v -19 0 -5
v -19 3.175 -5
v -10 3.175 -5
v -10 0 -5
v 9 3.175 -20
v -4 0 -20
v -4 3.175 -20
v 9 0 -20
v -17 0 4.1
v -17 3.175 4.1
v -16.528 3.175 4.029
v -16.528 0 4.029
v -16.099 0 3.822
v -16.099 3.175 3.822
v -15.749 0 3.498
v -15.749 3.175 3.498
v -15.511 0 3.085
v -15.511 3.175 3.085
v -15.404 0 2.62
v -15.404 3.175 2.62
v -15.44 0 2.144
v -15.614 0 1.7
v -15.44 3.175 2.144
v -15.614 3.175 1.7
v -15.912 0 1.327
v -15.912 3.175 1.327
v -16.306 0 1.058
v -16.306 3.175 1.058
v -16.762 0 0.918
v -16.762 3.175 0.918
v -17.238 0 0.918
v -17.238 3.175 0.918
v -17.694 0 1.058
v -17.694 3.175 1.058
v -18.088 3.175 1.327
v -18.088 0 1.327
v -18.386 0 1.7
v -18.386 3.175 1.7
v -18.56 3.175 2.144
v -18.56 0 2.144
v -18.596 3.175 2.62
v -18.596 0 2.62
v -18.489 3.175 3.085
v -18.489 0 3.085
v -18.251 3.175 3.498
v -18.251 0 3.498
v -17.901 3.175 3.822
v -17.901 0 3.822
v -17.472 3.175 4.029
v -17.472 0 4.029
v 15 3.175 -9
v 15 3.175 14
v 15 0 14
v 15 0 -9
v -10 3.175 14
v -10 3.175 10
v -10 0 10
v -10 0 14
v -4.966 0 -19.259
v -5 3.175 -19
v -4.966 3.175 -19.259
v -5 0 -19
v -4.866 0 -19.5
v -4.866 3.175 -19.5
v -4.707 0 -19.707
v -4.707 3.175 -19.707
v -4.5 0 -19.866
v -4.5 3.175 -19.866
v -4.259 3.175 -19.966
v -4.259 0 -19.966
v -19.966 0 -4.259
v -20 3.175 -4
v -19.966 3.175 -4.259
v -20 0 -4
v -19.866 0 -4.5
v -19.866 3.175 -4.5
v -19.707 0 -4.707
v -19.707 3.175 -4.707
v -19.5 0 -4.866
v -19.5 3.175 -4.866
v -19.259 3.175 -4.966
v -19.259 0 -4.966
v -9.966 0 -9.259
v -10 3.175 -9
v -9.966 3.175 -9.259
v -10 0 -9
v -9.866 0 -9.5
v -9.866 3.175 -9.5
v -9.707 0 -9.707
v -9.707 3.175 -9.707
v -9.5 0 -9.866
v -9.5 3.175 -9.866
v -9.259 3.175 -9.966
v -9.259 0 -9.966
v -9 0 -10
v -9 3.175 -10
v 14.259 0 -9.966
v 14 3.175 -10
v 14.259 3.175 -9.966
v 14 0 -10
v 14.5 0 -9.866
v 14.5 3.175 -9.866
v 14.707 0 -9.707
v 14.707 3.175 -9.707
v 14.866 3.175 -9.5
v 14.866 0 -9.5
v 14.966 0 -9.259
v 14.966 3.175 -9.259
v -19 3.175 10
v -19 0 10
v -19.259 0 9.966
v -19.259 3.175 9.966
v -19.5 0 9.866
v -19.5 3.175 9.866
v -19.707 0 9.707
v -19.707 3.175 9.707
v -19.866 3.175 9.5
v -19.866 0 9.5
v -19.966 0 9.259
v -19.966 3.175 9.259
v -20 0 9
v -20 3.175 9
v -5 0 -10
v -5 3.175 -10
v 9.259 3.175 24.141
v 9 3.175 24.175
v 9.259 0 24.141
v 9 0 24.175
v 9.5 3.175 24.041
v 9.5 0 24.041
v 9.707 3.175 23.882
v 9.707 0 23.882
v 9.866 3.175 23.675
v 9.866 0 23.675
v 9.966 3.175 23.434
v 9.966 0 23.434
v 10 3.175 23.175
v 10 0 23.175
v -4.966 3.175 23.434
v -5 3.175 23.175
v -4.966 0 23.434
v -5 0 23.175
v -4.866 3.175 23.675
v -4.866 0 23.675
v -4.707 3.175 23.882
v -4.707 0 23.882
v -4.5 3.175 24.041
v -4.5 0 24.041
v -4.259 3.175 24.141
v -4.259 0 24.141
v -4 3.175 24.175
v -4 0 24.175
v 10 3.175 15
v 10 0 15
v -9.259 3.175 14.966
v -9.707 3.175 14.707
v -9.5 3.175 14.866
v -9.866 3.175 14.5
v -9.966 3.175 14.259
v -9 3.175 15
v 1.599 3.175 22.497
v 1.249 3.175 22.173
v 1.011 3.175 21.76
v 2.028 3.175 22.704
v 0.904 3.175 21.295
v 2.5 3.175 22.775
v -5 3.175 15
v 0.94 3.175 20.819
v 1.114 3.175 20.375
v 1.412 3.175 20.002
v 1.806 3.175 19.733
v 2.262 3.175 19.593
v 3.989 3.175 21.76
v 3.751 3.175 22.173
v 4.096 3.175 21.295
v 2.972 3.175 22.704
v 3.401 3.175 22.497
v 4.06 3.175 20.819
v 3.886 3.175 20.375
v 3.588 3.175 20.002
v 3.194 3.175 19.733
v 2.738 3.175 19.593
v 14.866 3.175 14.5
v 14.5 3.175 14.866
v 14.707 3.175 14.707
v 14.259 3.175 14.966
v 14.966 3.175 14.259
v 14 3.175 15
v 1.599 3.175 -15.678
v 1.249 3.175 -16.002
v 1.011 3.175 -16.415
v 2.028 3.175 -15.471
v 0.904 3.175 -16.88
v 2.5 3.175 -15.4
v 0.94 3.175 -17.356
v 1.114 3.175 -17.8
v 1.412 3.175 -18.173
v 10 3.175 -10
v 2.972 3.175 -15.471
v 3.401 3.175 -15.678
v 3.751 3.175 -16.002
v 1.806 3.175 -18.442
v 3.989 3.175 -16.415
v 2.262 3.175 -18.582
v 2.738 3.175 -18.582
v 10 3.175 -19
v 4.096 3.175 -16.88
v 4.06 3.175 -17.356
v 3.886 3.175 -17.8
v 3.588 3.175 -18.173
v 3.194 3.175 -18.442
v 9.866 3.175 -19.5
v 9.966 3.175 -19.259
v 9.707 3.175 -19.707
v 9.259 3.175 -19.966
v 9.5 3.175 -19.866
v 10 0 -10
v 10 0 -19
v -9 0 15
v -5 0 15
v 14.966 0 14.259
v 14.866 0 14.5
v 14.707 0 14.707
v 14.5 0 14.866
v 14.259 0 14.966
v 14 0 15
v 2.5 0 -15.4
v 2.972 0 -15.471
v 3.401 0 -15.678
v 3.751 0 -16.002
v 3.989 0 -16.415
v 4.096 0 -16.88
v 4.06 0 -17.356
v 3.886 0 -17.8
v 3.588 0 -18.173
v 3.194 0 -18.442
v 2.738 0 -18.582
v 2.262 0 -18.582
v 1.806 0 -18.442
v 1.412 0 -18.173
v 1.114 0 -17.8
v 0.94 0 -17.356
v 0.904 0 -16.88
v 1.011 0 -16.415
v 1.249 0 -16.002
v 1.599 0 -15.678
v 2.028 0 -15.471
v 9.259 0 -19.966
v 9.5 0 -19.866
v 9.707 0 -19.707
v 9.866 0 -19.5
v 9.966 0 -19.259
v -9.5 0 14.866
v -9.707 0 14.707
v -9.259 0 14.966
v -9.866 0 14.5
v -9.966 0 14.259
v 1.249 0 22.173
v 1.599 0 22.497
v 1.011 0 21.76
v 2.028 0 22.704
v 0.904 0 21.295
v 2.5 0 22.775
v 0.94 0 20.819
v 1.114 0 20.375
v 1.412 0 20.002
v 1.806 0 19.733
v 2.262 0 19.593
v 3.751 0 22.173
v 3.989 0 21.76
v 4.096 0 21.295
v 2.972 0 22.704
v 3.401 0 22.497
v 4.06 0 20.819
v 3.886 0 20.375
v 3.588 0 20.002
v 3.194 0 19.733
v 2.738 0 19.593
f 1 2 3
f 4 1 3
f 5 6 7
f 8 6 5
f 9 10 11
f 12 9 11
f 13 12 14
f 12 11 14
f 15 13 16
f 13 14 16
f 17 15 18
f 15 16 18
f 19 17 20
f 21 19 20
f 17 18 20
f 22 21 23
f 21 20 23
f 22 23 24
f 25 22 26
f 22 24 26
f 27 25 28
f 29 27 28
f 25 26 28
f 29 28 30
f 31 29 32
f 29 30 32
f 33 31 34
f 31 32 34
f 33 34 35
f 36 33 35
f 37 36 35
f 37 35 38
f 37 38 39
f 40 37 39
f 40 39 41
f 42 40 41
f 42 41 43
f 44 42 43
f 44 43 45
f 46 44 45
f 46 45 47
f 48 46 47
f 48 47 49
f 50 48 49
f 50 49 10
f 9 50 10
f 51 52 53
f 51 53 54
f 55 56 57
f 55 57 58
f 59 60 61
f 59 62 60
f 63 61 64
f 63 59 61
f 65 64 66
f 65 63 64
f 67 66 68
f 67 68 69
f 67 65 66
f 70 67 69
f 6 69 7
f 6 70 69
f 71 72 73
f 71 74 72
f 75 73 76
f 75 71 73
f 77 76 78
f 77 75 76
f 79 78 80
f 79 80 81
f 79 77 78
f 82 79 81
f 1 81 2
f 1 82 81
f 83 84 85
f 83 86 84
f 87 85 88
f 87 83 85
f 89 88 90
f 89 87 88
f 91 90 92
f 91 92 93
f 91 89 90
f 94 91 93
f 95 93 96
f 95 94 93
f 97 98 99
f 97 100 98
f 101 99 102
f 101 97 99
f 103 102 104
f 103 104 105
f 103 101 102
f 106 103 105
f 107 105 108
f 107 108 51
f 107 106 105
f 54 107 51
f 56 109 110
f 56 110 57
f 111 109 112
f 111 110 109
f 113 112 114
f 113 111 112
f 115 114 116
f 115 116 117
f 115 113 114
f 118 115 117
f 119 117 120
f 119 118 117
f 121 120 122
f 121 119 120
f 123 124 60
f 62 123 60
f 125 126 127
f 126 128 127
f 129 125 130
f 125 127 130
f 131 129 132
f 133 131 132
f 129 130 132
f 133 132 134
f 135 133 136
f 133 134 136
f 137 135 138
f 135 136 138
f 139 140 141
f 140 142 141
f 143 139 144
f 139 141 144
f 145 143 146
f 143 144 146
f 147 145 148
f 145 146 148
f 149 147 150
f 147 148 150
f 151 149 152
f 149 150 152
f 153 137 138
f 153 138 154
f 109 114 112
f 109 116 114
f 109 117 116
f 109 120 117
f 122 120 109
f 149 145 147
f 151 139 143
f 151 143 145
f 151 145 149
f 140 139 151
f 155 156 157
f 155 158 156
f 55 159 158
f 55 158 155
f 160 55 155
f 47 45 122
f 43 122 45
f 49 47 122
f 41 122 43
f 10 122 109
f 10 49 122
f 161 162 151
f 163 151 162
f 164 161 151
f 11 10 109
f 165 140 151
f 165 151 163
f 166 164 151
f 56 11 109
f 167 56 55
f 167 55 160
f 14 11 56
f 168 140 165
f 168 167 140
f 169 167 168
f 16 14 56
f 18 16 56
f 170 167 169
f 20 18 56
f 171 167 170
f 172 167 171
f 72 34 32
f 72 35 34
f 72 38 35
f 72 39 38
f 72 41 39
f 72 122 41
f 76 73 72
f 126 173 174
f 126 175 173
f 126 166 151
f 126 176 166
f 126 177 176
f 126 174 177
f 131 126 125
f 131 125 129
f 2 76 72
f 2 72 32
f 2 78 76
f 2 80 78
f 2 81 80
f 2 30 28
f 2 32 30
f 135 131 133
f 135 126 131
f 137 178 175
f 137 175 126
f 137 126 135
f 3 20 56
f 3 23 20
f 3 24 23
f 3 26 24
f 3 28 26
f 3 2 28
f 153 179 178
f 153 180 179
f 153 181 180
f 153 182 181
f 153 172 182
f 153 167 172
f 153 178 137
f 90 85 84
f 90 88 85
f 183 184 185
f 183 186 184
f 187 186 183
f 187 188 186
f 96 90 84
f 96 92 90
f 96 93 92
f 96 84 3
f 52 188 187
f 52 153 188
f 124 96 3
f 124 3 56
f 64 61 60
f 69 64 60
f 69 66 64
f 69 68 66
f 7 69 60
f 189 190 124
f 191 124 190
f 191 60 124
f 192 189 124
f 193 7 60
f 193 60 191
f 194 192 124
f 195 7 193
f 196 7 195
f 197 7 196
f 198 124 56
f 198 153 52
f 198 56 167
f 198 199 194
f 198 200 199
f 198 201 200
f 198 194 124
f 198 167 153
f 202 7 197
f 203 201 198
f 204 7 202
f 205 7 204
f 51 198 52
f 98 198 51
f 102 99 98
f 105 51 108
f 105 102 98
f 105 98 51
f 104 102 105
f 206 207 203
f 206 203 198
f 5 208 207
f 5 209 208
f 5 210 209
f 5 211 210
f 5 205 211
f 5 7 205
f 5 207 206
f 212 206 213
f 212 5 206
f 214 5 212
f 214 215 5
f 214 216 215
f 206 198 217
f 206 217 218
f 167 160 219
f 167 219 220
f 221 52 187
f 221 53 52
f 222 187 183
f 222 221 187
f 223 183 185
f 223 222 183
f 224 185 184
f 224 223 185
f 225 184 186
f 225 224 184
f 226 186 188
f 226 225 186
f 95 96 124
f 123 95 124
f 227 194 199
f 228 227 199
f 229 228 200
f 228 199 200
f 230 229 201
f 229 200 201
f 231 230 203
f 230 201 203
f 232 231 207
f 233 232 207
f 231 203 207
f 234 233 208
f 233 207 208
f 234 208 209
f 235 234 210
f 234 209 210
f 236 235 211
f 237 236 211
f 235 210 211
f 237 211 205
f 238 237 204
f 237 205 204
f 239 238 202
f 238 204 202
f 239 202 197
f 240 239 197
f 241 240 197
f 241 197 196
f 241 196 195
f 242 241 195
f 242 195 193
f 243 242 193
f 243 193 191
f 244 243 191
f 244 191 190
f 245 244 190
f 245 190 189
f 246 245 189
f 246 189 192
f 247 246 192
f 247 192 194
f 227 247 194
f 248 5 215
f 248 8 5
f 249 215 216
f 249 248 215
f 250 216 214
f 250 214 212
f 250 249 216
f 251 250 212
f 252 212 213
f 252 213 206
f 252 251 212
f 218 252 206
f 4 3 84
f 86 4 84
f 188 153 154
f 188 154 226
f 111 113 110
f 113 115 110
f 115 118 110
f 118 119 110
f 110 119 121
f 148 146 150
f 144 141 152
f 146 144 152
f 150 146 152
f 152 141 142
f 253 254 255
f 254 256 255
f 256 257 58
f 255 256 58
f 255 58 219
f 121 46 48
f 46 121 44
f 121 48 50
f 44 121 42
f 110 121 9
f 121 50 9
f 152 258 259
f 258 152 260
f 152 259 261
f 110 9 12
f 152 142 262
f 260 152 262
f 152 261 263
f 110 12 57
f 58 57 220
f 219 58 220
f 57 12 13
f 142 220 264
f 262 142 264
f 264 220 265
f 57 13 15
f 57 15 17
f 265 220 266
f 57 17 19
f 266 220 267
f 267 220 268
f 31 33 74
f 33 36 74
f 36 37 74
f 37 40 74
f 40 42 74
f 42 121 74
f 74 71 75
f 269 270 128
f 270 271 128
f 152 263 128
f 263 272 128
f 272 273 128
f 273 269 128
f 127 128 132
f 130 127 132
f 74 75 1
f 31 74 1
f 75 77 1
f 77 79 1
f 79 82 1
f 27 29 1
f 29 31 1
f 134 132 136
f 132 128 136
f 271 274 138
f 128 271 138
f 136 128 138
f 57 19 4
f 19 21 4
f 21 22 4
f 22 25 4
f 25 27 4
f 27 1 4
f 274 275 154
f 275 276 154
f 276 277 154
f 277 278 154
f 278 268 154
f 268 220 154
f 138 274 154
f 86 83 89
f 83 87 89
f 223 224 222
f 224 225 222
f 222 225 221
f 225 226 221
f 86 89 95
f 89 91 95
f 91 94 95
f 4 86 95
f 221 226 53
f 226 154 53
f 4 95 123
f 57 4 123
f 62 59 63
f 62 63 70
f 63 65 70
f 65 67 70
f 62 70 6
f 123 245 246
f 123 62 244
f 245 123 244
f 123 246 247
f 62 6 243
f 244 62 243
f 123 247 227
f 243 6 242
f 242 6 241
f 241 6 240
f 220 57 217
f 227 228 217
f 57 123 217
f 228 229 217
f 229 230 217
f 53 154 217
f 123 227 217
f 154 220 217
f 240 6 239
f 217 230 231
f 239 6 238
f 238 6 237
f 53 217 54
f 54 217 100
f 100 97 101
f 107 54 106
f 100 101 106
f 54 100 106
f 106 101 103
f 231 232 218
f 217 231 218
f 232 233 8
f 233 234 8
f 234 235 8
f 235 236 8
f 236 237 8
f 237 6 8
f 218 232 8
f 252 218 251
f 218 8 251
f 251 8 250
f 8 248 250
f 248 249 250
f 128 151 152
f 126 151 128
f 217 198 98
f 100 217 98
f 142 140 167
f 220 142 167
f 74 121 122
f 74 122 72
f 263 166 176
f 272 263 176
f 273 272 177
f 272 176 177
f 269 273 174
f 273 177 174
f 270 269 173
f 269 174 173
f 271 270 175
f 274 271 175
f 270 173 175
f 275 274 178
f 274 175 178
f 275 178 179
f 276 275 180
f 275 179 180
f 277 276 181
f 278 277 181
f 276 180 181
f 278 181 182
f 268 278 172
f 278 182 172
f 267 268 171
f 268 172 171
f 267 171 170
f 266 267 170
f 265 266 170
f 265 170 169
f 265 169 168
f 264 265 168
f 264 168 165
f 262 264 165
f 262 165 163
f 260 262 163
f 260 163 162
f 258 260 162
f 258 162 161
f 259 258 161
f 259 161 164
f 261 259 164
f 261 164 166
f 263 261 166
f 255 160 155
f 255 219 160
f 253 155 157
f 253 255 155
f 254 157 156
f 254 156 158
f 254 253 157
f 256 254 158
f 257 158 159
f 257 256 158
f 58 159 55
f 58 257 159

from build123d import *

# Parameters (mm, degrees)
SKETCH1_W           = 40
SKETCH1_H           = 40
BOSS_EXTRUDE1_DEPTH = 3.175
SKETCH3_W           = 15
SKETCH3_H           = 10
SKETCH3_W_2         = 10
CUT_EXTRUDE2_DEPTH  = 10
SKETCH4_R           = 1.6
CUT_EXTRUDE3_DEPTH  = 29.461915343
SKETCH5_W           = 10
SKETCH5_H           = 5
CUT_EXTRUDE4_DEPTH  = 10
SKETCH7_R           = 1.6
CUT_EXTRUDE6_DEPTH  = 10
SKETCH8_W           = 15
SKETCH8_H           = 34.175
BOSS_EXTRUDE2_DEPTH = 3.175
SKETCH9_R           = 1.6
CUT_EXTRUDE7_DEPTH  = 32.535872431
SKETCH10_W          = 5
SKETCH10_H          = 25
CUT_EXTRUDE8_DEPTH  = 10
FILLET1_R           = 1


with BuildPart() as part:
    # Sketch1 → Boss-Extrude1 (new body)
    with BuildSketch(Plane(origin=(0, 0, 0), x_dir=(1, 0, 0), z_dir=(0, 1, 0))):
        Rectangle(SKETCH1_W, SKETCH1_H)
    extrude(amount=BOSS_EXTRUDE1_DEPTH)

    # Sketch3 → Cut-Extrude2 (cut)
    with BuildSketch(Plane(origin=(0, 3.175, 0), x_dir=(1, 0, 0), z_dir=(0, 1, 0))):
        with Locations((-12.5, 15)):
            Rectangle(SKETCH3_W, SKETCH3_H)
        with Locations((15, 15)):
            Rectangle(SKETCH3_W_2, SKETCH3_H)
    extrude(amount=-CUT_EXTRUDE2_DEPTH, mode=Mode.SUBTRACT)

    # Sketch4 → Cut-Extrude3 (cut, through all)
    with BuildSketch(Plane(origin=(0, 3.175, 0), x_dir=(1, 0, 0), z_dir=(0, 1, 0))):
        with Locations(Location((2.5, 17, 0), (0, 0, 270))):
            Circle(SKETCH4_R)
    extrude(amount=-CUT_EXTRUDE3_DEPTH, mode=Mode.SUBTRACT)

    # Sketch5 → Cut-Extrude4 (cut)
    with BuildSketch(Plane(origin=(0, 3.175, 0), x_dir=(1, 0, 0), z_dir=(0, 1, 0))):
        with Locations((-15, 7.5)):
            Rectangle(SKETCH5_W, SKETCH5_H)
        Polygon((-10, -20), (-20, -20), (-20, -10), (-10, -10), (-10, -15), (20, -15), (20, -20), align=None)
    extrude(amount=-CUT_EXTRUDE4_DEPTH, mode=Mode.SUBTRACT)

    # Sketch7 → Cut-Extrude6 (cut)
    with BuildSketch(Plane(origin=(0, 3.175, 0), x_dir=(1, 0, 0), z_dir=(0, 1, 0))):
        with Locations(Location((-17, -2.5, 0), (0, 0, 270))):
            Circle(SKETCH7_R)
    extrude(amount=-CUT_EXTRUDE6_DEPTH, mode=Mode.SUBTRACT)

    # Sketch8 → Boss-Extrude2 (add)
    with BuildSketch(Plane(origin=(0, 3.175, 0), x_dir=(1, 0, 0), z_dir=(0, 1, 0))):
        with Locations((2.5, -7.0875)):
            Rectangle(SKETCH8_W, SKETCH8_H)
    extrude(amount=-BOSS_EXTRUDE2_DEPTH)

    # Sketch9 → Cut-Extrude7 (cut, through all)
    with BuildSketch(Plane(origin=(0, 3.175, 0), x_dir=(1, 0, 0), z_dir=(0, 1, 0))):
        with Locations(Location((2.5, -21.175, 0), (0, 0, 270))):
            Circle(SKETCH9_R)
    extrude(amount=-CUT_EXTRUDE7_DEPTH, mode=Mode.SUBTRACT)

    # Sketch10 → Cut-Extrude8 (cut)
    with BuildSketch(Plane(origin=(0, 3.175, 0), x_dir=(1, 0, 0), z_dir=(0, 1, 0))):
        with Locations((17.5, -2.5)):
            Rectangle(SKETCH10_W, SKETCH10_H)
    extrude(amount=-CUT_EXTRUDE8_DEPTH, mode=Mode.SUBTRACT)

    # Fillet1
    fillet1_edges = [part.edges().sort_by_distance(p)[0] for p in [
        (-5, 1.5875, 24.175),
        (10, 1.5875, 24.175),
        (15, 1.5875, 15),
        (15, 1.5875, -10),
        (-5, 1.5875, -20),
        (10, 1.5875, -20),
        (-10, 1.5875, -10),
        (-20, 1.5875, -5),
        (-20, 1.5875, 10),
        (-10, 1.5875, 15),
    ]]
    fillet(fillet1_edges, radius=FILLET1_R)


solid = part.part
